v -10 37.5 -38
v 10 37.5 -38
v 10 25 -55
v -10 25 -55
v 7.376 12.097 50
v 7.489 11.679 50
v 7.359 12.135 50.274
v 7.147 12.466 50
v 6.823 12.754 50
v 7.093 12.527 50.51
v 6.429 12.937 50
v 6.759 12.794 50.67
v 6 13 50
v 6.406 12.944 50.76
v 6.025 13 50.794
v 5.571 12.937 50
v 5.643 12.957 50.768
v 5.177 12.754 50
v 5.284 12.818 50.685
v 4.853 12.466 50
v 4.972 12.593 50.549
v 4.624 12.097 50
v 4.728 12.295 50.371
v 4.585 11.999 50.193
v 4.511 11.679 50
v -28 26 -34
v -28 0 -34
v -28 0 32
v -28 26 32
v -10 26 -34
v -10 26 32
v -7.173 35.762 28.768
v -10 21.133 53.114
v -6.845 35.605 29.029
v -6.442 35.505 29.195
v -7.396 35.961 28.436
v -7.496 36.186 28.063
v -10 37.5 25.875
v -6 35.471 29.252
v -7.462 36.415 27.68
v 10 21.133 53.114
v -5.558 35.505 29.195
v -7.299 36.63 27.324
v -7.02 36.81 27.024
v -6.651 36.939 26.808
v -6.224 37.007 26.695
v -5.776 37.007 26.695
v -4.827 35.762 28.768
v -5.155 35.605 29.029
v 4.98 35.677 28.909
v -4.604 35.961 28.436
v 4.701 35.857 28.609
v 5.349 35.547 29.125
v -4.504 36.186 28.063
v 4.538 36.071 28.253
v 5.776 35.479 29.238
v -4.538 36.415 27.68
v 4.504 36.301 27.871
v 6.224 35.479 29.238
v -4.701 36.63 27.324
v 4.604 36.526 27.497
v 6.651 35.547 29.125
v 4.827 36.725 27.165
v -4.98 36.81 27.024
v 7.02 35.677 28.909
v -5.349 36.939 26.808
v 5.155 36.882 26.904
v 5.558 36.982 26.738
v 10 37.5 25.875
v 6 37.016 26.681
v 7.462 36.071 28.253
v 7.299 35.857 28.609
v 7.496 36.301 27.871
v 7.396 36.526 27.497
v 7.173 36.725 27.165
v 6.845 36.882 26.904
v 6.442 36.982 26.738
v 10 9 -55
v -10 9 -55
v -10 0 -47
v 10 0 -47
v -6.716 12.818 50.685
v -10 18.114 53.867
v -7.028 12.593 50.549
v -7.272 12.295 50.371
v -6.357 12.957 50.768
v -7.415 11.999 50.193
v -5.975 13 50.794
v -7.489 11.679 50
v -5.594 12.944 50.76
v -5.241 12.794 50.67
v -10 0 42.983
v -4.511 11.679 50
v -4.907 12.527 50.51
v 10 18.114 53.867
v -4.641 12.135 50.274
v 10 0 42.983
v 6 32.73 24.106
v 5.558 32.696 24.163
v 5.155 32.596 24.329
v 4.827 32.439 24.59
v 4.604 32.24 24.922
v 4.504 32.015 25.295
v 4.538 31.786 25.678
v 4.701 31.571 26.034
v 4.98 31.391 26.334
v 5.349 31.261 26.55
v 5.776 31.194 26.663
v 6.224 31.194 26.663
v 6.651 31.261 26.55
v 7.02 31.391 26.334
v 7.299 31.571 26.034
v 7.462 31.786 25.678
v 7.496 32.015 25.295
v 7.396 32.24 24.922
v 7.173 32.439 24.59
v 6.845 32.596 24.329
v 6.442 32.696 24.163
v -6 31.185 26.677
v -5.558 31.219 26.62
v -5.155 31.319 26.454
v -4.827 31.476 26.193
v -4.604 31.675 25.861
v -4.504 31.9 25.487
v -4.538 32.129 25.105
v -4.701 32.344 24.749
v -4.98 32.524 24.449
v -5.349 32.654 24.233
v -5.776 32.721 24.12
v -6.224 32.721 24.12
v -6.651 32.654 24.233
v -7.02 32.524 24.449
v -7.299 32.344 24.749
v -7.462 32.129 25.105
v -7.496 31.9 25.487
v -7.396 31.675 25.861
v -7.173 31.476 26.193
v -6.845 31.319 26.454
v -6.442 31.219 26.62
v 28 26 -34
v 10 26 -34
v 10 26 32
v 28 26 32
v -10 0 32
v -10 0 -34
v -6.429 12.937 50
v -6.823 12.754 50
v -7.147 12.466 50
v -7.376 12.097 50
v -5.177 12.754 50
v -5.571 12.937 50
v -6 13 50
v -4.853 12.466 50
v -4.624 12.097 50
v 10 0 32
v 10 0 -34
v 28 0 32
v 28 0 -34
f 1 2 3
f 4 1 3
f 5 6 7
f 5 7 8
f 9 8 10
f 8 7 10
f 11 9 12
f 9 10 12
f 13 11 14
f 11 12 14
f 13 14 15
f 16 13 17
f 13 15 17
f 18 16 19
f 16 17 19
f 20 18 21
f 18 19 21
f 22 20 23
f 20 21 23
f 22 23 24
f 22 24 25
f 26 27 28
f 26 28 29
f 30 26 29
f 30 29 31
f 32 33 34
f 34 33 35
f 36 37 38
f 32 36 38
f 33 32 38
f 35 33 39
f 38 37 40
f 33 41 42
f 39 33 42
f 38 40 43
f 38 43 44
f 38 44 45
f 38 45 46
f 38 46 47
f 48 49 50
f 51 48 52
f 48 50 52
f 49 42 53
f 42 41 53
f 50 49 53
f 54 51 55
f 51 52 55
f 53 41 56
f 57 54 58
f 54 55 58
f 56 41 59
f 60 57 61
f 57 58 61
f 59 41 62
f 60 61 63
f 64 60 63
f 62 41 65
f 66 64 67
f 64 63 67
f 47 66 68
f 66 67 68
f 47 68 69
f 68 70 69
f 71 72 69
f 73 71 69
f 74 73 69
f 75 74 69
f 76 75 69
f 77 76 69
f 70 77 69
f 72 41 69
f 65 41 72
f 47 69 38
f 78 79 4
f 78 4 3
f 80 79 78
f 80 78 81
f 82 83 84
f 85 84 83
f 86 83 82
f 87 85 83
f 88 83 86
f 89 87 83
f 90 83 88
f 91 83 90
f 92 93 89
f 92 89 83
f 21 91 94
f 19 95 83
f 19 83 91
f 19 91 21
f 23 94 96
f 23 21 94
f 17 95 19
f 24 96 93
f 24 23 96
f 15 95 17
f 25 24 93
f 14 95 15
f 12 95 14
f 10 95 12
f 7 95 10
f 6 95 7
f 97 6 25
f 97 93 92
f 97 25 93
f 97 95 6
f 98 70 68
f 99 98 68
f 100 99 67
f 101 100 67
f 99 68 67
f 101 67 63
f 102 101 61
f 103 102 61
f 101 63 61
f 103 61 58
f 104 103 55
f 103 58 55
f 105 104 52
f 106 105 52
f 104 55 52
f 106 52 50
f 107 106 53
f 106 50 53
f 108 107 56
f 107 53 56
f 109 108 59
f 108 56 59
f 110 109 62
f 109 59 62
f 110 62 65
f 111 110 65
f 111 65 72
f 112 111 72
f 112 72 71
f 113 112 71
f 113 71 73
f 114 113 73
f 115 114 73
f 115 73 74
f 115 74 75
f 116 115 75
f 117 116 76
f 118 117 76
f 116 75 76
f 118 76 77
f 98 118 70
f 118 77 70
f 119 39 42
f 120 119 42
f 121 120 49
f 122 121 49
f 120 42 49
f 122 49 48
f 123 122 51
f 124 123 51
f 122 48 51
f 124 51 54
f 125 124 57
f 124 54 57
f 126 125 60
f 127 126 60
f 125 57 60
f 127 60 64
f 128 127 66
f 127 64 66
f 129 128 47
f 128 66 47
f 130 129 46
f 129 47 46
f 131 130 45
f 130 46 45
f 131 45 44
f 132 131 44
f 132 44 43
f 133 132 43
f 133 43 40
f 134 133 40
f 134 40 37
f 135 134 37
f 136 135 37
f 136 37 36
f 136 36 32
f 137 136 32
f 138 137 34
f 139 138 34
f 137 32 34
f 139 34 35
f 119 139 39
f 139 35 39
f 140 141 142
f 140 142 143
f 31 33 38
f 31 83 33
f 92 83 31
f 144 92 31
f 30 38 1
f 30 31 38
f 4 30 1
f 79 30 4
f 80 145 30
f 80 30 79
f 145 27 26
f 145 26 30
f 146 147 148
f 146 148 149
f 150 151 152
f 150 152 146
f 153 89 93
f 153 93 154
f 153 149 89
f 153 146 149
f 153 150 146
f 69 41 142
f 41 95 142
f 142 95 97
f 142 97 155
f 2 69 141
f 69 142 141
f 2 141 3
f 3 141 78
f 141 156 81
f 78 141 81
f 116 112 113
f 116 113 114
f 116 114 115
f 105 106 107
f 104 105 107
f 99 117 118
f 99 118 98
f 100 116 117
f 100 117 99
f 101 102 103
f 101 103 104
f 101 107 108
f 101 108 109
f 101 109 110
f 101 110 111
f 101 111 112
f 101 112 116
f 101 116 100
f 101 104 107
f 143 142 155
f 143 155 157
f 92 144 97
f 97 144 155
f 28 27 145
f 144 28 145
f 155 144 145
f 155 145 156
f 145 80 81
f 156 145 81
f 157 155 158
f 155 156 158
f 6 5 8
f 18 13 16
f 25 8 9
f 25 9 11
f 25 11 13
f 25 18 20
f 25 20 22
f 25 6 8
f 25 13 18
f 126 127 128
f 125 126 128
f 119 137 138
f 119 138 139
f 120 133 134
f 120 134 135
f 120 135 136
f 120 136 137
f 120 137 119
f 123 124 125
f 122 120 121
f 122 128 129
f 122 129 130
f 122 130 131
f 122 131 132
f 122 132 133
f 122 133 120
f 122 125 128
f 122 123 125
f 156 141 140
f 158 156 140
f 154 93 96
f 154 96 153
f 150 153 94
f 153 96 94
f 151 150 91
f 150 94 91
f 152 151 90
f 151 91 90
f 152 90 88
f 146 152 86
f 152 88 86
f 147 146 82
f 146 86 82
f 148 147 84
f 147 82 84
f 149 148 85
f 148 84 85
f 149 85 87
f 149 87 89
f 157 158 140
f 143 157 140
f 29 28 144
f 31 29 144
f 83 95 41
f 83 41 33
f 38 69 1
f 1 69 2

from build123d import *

# Parameters (mm, degrees)
SKETCH_1_W           = 20
SKETCH_1_H           = 110
EXTRUDE_1_DEPTH      = 38
EXTRUDE_4_DEPTH      = 32
EXTRUDE_4_DEPTH_BACK = 34
SKETCH_2_W           = 18
SKETCH_2_H           = 26
CUT_EXTRUDE_1_DEPTH  = 20
SKETCH_9_R           = 1.5
CUT_EXTRUDE_3_DEPTH  = 5
SKETCH_10_W          = 99.275483207
SKETCH_10_H          = 3
CUT_EXTRUDE_4_DEPTH  = 77.896033708
SKETCH_8_R           = 1.5
CUT_EXTRUDE_2_DEPTH  = 5
CUT_EXTRUDE_5_DEPTH  = 77.650179387
CUT_EXTRUDE_6_DEPTH  = 77.650179387
CHAMFER_1_SIZE       = 2.2


with BuildPart() as part:
    # 草图1 → 凸台-拉伸1 (new body)
    with BuildSketch(Plane(origin=(0, 0, 0), x_dir=(1, 0, 0), z_dir=(0, 1, 0))):
        Rectangle(SKETCH_1_W, SKETCH_1_H)
    extrude(amount=EXTRUDE_1_DEPTH)

    # 草图2 → 凸台-拉伸4 (add, two sides: drawn at the far end of the back side and taken through both)
    with BuildSketch(Plane.XY.offset(-EXTRUDE_4_DEPTH_BACK)):
        with Locations((19, 13)):
            Rectangle(SKETCH_2_W, SKETCH_2_H)
        with Locations((-19, 13)):
            Rectangle(SKETCH_2_W, SKETCH_2_H)
    extrude(amount=EXTRUDE_4_DEPTH + EXTRUDE_4_DEPTH_BACK)

    # 草图7 → 切除-拉伸1 (cut)
    with BuildSketch(Plane(origin=(10, 0, 0), x_dir=(0, 0, -1), z_dir=(1, 0, 0))):
        Polygon((-55, 38), (-55, 20), (-25.042969318, 38), align=None)
    extrude(amount=-CUT_EXTRUDE_1_DEPTH, mode=Mode.SUBTRACT)

    # 草图9 → 切除-拉伸3 (cut)
    with BuildSketch(Plane.XY.offset(55)):
        with Locations((-6, 11.5)):
            Circle(SKETCH_9_R)
        with Locations(Location((6, 11.5, 0), (0, 0, 180))):
            Circle(SKETCH_9_R)
    extrude(amount=-CUT_EXTRUDE_3_DEPTH, mode=Mode.SUBTRACT)

    # 草图10 → 切除-拉伸4 (cut, through all)
    with BuildSketch(Plane(origin=(10, 0, 0), x_dir=(0, 0, -1), z_dir=(1, 0, 0))):
        with Locations((8.83578939, 39)):
            Rectangle(SKETCH_10_W, SKETCH_10_H)
    extrude(amount=-CUT_EXTRUDE_4_DEPTH, mode=Mode.SUBTRACT)

    # 草图8 → 切除-拉伸2 (cut)
    with BuildSketch(Plane(origin=(0, 38.975774431, 23.419007952), x_dir=(1, 0, 0), z_dir=(0, 0.8571673007021134, 0.5150380749100524))):
        with Locations(Location((-6, -5.305369578, 0), (0, 0, 270))):
            Circle(SKETCH_8_R)
        with Locations(Location((6, -5.305369578, 0), (0, 0, 90))):
            Circle(SKETCH_8_R)
    extrude(amount=-CUT_EXTRUDE_2_DEPTH, mode=Mode.SUBTRACT)

    # 草图11 → 切除-拉伸5 (cut, through all)
    with BuildSketch(Plane(origin=(10, 0, 0), x_dir=(0, 0, -1), z_dir=(1, 0, 0))):
        Polygon((55, 37.5), (38, 37.5), (55, 25), align=None)
        Polygon((55, 0), (55, 9), (47, 0), align=None)
    extrude(amount=-CUT_EXTRUDE_5_DEPTH, mode=Mode.SUBTRACT)

    # 草图12 → 切除-拉伸6 (cut, through all)
    with BuildSketch(Plane(origin=(10, 0, 0), x_dir=(0, 0, -1), z_dir=(1, 0, 0))):
        Polygon((-55, 20), (-42.982787619, 0), (-55, 0), align=None)
    extrude(amount=-CUT_EXTRUDE_6_DEPTH, mode=Mode.SUBTRACT)

    # 倒角1
    chamfer_1_edges = [part.edges().sort_by_distance(p)[0] for p in [
        (0, 20, 55),
    ]]
    chamfer(chamfer_1_edges, length=CHAMFER_1_SIZE)


solid = part.part
